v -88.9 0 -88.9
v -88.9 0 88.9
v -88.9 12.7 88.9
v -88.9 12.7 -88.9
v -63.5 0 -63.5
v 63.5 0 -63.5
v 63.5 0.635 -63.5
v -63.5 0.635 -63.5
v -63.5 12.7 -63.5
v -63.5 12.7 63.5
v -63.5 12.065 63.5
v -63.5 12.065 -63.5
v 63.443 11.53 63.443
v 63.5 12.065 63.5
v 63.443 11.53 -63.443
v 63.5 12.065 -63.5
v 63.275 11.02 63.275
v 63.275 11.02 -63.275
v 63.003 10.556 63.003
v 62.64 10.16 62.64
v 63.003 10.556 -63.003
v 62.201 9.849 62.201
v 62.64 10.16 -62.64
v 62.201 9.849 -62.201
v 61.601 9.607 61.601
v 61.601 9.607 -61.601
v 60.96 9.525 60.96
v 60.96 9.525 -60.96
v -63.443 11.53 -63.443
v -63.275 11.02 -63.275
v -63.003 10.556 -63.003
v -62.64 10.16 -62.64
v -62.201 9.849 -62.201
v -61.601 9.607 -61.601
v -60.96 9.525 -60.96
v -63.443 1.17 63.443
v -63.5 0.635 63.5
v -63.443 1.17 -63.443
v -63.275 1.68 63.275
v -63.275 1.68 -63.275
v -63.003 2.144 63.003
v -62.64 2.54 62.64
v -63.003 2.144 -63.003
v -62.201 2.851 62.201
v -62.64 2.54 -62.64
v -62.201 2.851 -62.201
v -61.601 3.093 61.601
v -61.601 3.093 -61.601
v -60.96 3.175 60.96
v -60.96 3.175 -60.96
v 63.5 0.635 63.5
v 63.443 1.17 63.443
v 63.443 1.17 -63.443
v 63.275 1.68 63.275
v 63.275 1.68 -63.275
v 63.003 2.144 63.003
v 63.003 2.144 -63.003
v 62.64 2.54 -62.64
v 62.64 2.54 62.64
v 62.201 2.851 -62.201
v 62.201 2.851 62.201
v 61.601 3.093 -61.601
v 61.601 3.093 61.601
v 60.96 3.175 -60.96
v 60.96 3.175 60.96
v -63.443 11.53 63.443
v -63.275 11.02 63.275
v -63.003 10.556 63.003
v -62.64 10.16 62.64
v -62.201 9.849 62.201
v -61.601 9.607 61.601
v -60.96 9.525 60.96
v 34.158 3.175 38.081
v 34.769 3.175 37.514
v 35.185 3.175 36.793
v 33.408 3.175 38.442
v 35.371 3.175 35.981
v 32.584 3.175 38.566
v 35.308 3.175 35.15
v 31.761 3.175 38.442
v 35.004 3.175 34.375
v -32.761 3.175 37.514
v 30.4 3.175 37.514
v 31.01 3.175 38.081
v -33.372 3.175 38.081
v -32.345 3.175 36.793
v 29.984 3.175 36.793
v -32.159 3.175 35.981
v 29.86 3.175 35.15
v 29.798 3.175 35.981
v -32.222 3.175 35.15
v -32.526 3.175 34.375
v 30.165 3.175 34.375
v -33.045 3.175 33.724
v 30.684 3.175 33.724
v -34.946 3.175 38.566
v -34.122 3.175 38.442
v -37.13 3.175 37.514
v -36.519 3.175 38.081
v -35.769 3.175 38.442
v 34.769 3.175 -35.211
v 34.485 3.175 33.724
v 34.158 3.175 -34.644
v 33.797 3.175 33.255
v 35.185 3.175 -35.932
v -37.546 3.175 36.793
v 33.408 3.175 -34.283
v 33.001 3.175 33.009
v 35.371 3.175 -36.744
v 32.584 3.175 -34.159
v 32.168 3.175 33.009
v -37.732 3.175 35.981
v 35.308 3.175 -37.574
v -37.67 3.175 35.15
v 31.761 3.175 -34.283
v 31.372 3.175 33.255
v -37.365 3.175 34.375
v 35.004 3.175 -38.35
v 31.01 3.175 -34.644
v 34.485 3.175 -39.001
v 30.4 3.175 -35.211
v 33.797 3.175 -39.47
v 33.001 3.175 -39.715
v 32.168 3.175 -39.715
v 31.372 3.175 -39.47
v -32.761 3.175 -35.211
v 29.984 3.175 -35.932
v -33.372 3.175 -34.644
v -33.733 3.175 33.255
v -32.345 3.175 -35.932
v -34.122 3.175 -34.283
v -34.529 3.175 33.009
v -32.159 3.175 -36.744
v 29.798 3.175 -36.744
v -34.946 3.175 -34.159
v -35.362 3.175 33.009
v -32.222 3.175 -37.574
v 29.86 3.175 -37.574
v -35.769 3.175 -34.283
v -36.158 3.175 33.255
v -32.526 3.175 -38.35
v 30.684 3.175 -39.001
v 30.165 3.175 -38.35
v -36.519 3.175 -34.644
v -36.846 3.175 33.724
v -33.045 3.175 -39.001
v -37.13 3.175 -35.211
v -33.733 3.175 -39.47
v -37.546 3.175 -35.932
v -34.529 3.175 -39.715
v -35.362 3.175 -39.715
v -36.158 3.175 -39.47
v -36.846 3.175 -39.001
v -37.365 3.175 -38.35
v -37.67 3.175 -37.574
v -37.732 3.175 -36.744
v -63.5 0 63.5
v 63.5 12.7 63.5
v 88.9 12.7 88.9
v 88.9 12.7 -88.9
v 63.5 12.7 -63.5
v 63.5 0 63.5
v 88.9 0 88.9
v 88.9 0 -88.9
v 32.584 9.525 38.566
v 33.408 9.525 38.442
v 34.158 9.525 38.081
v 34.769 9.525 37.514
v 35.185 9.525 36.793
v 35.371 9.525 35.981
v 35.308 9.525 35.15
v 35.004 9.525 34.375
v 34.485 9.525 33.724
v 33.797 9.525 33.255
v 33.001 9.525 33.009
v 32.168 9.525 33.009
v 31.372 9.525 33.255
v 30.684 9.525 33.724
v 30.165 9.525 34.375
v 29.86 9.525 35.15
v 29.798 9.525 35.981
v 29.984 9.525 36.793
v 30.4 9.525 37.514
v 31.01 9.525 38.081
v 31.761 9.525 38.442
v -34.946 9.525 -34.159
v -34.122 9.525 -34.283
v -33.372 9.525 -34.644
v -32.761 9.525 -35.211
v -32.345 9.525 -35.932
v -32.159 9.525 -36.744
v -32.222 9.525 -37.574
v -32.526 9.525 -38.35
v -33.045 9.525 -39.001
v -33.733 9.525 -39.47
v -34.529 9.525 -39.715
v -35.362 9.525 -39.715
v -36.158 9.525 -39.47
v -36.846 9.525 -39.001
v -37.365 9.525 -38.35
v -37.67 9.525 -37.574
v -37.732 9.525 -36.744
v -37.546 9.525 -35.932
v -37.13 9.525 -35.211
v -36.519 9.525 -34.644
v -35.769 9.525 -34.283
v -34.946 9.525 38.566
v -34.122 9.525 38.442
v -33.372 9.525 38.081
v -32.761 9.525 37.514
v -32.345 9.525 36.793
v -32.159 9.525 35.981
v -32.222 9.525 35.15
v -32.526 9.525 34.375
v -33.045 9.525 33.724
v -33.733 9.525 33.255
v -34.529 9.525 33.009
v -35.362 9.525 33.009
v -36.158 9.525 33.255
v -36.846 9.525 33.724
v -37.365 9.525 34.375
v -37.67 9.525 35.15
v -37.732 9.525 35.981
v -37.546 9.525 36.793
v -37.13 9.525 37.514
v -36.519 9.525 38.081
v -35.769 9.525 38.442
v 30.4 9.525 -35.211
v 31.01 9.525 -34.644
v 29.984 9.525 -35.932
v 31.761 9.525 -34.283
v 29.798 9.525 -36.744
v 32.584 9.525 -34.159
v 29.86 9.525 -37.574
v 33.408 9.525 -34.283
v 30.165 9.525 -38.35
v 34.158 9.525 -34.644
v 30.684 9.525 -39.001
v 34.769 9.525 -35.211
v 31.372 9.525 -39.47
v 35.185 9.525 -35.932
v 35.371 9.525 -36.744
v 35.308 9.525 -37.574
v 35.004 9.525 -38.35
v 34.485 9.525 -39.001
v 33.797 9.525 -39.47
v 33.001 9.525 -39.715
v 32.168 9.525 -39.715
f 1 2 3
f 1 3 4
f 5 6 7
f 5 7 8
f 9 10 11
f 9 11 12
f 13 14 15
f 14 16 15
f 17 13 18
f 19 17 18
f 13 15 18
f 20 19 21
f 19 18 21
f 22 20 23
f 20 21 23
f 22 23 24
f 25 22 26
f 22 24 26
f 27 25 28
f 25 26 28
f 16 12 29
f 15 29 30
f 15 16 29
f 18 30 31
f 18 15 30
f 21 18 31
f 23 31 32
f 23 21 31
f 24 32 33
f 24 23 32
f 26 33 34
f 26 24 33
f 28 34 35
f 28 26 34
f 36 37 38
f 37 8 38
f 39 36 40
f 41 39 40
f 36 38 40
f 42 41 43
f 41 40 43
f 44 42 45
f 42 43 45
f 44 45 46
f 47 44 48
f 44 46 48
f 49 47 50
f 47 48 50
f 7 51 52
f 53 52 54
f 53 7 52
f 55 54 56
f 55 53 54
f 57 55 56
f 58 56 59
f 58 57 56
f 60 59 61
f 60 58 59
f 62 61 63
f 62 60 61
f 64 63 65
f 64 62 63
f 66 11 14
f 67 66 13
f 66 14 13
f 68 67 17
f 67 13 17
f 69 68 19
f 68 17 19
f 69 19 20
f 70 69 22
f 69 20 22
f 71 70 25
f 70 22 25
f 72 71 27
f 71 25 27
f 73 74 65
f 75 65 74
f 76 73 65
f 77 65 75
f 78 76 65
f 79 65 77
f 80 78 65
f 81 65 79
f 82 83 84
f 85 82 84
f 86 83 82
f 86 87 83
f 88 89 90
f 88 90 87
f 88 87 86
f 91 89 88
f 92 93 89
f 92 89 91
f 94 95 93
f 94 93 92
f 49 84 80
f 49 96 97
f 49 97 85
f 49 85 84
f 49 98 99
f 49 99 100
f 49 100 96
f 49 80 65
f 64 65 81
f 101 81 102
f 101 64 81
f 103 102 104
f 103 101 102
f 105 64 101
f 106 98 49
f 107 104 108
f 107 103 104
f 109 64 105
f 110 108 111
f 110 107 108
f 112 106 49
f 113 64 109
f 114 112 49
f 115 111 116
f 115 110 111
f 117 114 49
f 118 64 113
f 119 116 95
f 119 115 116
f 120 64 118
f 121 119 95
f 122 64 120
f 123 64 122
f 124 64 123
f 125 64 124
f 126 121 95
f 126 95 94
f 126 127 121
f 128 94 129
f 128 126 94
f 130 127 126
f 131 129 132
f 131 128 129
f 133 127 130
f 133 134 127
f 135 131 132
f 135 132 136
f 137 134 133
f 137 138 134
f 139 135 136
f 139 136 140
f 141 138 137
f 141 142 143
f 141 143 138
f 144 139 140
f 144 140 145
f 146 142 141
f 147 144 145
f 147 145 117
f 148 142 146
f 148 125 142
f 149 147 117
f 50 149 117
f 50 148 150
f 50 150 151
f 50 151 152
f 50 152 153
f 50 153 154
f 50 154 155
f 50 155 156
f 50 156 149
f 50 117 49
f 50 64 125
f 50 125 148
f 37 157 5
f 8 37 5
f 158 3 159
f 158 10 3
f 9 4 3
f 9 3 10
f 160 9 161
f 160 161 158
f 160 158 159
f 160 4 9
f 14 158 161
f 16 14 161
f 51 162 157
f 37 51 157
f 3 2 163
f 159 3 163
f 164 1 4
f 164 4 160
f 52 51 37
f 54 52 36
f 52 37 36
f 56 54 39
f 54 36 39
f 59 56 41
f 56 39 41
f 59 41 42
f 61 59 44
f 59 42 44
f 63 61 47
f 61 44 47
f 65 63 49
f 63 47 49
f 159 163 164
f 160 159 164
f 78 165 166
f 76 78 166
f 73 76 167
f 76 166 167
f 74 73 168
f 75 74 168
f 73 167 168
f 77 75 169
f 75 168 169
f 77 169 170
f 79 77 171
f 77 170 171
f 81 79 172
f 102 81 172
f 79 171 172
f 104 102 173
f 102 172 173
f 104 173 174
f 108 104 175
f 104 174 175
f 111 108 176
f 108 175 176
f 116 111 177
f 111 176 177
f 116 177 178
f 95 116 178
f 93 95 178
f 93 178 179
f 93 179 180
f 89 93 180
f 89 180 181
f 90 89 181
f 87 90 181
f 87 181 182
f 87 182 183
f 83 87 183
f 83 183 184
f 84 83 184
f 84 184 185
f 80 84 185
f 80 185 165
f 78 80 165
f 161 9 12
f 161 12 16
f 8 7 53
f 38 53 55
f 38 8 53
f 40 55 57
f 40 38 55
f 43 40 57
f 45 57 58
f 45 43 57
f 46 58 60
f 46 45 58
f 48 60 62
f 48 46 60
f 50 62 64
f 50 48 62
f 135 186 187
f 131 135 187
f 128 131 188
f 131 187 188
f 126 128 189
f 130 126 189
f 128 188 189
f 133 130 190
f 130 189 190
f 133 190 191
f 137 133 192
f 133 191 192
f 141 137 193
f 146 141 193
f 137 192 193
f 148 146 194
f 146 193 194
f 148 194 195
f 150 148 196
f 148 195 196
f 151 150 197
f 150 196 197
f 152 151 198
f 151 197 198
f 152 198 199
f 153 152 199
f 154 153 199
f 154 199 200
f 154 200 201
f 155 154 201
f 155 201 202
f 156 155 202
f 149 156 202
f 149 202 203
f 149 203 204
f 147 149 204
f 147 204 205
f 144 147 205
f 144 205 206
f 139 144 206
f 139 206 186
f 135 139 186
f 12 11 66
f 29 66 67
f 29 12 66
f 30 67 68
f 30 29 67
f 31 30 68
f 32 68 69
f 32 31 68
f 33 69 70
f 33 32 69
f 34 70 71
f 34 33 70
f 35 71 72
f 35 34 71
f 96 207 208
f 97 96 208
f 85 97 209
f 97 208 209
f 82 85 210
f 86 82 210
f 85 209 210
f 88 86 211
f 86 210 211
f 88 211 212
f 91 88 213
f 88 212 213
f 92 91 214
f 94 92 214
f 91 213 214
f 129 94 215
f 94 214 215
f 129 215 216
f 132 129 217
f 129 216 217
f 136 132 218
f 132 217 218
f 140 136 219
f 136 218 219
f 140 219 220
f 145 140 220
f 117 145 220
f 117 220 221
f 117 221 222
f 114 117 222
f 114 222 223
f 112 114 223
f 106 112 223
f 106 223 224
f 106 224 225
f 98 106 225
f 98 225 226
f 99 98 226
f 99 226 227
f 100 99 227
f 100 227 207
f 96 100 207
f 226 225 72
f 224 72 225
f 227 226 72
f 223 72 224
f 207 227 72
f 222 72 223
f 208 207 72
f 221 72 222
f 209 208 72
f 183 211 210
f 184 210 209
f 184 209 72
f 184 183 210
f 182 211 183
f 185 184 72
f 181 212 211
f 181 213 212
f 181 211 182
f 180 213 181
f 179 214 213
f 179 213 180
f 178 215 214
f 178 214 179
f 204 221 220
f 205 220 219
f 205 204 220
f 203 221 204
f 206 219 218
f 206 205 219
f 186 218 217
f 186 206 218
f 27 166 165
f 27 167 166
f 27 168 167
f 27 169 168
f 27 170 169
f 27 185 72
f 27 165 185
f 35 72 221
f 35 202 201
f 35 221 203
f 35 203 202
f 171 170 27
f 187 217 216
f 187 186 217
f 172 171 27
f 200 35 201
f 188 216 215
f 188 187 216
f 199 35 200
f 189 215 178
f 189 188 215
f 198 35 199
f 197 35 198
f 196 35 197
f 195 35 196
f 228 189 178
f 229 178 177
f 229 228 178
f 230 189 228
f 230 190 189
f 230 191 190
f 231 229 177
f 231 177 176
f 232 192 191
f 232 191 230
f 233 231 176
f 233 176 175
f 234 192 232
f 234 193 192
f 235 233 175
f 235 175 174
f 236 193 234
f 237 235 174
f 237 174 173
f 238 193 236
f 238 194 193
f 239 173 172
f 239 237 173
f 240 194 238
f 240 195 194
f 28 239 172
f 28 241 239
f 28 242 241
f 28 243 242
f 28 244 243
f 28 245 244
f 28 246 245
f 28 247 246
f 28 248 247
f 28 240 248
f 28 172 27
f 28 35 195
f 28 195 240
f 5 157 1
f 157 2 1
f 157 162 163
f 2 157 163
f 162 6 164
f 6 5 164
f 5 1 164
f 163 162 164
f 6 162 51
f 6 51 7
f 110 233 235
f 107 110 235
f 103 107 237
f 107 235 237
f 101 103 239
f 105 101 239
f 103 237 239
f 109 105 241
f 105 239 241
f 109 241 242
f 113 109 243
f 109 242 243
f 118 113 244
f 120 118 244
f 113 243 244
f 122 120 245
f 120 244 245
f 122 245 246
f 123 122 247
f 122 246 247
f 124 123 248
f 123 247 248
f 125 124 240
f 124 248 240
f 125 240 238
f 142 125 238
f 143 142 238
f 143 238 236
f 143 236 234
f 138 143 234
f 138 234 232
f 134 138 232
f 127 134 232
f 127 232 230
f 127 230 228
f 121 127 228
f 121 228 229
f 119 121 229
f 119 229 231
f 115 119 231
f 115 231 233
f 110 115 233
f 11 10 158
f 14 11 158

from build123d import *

# Parameters (mm, degrees)
SKETCH10_W          = 177.8
SKETCH10_H          = 177.8
BOSS_EXTRUDE4_DEPTH = 12.7
SKETCH12_W          = 127
SKETCH12_H          = 127
BOSS_EXTRUDE5_DEPTH = 3.175
SKETCH13_W          = 127
SKETCH13_H          = 127
CUT_EXTRUDE1_DEPTH  = 3.175
SKETCH14_W          = 127
SKETCH14_H          = 127
CUT_EXTRUDE2_DEPTH  = 3.175
FILLET4_R           = 2.54
SKETCH16_R          = 2.794
CUT_EXTRUDE3_DEPTH  = 25.4


with BuildPart() as part:
    # Sketch10 → Boss-Extrude4 (new body)
    with BuildSketch(Plane(origin=(0, 0, 0), x_dir=(1, 0, 0), z_dir=(0, 1, 0))):
        Rectangle(SKETCH10_W, SKETCH10_H)
    extrude(amount=BOSS_EXTRUDE4_DEPTH)

    # Sketch12 → Boss-Extrude5 (add)
    with BuildSketch(Plane(origin=(0, 12.7, 0), x_dir=(1, 0, 0), z_dir=(0, 1, 0))):
        Rectangle(SKETCH12_W, SKETCH12_H)
    extrude(amount=-BOSS_EXTRUDE5_DEPTH)

    # Sketch13 → Cut-Extrude1 (cut)
    with BuildSketch(Plane(origin=(0, 12.7, 0), x_dir=(1, 0, 0), z_dir=(0, 1, 0))):
        Rectangle(SKETCH13_W, SKETCH13_H)
    extrude(amount=-CUT_EXTRUDE1_DEPTH, mode=Mode.SUBTRACT)

    # Sketch14 → Cut-Extrude2 (cut)
    with BuildSketch(Plane(origin=(0, 0, 0), x_dir=(-1, 0, 0), z_dir=(0, -1, 0))):
        Rectangle(SKETCH14_W, SKETCH14_H)
    extrude(amount=-CUT_EXTRUDE2_DEPTH, mode=Mode.SUBTRACT)

    # Fillet4
    fillet4_edges = [part.edges().sort_by_distance(p)[0] for p in [
        (-63.5, 9.525, 0),
        (0, 9.525, -63.5),
        (63.5, 9.525, 0),
        (0, 9.525, 63.5),
        (63.5, 3.175, 0),
        (0, 3.175, -63.5),
        (-63.5, 3.175, 0),
        (0, 3.175, 63.5),
    ]]
    fillet(fillet4_edges, radius=FILLET4_R)

    # Sketch16 → Cut-Extrude3 (cut)
    with BuildSketch(Plane(origin=(0, 9.525, 0), x_dir=(1, 0, 0), z_dir=(0, 1, 0))):
        with Locations(Location((-34.945581996, 36.952591773, 0), (0, 0, 270))):
            Circle(SKETCH16_R)
        with Locations(Location((32.584394023, 36.952591773, 0), (0, 0, 270))):
            Circle(SKETCH16_R)
        with Locations(Location((-34.945581996, -35.771997786, 0), (0, 0, 270))):
            Circle(SKETCH16_R)
        with Locations(Location((32.584394023, -35.771997786, 0), (0, 0, 270))):
            Circle(SKETCH16_R)
    extrude(amount=-CUT_EXTRUDE3_DEPTH, mode=Mode.SUBTRACT)


solid = part.part
